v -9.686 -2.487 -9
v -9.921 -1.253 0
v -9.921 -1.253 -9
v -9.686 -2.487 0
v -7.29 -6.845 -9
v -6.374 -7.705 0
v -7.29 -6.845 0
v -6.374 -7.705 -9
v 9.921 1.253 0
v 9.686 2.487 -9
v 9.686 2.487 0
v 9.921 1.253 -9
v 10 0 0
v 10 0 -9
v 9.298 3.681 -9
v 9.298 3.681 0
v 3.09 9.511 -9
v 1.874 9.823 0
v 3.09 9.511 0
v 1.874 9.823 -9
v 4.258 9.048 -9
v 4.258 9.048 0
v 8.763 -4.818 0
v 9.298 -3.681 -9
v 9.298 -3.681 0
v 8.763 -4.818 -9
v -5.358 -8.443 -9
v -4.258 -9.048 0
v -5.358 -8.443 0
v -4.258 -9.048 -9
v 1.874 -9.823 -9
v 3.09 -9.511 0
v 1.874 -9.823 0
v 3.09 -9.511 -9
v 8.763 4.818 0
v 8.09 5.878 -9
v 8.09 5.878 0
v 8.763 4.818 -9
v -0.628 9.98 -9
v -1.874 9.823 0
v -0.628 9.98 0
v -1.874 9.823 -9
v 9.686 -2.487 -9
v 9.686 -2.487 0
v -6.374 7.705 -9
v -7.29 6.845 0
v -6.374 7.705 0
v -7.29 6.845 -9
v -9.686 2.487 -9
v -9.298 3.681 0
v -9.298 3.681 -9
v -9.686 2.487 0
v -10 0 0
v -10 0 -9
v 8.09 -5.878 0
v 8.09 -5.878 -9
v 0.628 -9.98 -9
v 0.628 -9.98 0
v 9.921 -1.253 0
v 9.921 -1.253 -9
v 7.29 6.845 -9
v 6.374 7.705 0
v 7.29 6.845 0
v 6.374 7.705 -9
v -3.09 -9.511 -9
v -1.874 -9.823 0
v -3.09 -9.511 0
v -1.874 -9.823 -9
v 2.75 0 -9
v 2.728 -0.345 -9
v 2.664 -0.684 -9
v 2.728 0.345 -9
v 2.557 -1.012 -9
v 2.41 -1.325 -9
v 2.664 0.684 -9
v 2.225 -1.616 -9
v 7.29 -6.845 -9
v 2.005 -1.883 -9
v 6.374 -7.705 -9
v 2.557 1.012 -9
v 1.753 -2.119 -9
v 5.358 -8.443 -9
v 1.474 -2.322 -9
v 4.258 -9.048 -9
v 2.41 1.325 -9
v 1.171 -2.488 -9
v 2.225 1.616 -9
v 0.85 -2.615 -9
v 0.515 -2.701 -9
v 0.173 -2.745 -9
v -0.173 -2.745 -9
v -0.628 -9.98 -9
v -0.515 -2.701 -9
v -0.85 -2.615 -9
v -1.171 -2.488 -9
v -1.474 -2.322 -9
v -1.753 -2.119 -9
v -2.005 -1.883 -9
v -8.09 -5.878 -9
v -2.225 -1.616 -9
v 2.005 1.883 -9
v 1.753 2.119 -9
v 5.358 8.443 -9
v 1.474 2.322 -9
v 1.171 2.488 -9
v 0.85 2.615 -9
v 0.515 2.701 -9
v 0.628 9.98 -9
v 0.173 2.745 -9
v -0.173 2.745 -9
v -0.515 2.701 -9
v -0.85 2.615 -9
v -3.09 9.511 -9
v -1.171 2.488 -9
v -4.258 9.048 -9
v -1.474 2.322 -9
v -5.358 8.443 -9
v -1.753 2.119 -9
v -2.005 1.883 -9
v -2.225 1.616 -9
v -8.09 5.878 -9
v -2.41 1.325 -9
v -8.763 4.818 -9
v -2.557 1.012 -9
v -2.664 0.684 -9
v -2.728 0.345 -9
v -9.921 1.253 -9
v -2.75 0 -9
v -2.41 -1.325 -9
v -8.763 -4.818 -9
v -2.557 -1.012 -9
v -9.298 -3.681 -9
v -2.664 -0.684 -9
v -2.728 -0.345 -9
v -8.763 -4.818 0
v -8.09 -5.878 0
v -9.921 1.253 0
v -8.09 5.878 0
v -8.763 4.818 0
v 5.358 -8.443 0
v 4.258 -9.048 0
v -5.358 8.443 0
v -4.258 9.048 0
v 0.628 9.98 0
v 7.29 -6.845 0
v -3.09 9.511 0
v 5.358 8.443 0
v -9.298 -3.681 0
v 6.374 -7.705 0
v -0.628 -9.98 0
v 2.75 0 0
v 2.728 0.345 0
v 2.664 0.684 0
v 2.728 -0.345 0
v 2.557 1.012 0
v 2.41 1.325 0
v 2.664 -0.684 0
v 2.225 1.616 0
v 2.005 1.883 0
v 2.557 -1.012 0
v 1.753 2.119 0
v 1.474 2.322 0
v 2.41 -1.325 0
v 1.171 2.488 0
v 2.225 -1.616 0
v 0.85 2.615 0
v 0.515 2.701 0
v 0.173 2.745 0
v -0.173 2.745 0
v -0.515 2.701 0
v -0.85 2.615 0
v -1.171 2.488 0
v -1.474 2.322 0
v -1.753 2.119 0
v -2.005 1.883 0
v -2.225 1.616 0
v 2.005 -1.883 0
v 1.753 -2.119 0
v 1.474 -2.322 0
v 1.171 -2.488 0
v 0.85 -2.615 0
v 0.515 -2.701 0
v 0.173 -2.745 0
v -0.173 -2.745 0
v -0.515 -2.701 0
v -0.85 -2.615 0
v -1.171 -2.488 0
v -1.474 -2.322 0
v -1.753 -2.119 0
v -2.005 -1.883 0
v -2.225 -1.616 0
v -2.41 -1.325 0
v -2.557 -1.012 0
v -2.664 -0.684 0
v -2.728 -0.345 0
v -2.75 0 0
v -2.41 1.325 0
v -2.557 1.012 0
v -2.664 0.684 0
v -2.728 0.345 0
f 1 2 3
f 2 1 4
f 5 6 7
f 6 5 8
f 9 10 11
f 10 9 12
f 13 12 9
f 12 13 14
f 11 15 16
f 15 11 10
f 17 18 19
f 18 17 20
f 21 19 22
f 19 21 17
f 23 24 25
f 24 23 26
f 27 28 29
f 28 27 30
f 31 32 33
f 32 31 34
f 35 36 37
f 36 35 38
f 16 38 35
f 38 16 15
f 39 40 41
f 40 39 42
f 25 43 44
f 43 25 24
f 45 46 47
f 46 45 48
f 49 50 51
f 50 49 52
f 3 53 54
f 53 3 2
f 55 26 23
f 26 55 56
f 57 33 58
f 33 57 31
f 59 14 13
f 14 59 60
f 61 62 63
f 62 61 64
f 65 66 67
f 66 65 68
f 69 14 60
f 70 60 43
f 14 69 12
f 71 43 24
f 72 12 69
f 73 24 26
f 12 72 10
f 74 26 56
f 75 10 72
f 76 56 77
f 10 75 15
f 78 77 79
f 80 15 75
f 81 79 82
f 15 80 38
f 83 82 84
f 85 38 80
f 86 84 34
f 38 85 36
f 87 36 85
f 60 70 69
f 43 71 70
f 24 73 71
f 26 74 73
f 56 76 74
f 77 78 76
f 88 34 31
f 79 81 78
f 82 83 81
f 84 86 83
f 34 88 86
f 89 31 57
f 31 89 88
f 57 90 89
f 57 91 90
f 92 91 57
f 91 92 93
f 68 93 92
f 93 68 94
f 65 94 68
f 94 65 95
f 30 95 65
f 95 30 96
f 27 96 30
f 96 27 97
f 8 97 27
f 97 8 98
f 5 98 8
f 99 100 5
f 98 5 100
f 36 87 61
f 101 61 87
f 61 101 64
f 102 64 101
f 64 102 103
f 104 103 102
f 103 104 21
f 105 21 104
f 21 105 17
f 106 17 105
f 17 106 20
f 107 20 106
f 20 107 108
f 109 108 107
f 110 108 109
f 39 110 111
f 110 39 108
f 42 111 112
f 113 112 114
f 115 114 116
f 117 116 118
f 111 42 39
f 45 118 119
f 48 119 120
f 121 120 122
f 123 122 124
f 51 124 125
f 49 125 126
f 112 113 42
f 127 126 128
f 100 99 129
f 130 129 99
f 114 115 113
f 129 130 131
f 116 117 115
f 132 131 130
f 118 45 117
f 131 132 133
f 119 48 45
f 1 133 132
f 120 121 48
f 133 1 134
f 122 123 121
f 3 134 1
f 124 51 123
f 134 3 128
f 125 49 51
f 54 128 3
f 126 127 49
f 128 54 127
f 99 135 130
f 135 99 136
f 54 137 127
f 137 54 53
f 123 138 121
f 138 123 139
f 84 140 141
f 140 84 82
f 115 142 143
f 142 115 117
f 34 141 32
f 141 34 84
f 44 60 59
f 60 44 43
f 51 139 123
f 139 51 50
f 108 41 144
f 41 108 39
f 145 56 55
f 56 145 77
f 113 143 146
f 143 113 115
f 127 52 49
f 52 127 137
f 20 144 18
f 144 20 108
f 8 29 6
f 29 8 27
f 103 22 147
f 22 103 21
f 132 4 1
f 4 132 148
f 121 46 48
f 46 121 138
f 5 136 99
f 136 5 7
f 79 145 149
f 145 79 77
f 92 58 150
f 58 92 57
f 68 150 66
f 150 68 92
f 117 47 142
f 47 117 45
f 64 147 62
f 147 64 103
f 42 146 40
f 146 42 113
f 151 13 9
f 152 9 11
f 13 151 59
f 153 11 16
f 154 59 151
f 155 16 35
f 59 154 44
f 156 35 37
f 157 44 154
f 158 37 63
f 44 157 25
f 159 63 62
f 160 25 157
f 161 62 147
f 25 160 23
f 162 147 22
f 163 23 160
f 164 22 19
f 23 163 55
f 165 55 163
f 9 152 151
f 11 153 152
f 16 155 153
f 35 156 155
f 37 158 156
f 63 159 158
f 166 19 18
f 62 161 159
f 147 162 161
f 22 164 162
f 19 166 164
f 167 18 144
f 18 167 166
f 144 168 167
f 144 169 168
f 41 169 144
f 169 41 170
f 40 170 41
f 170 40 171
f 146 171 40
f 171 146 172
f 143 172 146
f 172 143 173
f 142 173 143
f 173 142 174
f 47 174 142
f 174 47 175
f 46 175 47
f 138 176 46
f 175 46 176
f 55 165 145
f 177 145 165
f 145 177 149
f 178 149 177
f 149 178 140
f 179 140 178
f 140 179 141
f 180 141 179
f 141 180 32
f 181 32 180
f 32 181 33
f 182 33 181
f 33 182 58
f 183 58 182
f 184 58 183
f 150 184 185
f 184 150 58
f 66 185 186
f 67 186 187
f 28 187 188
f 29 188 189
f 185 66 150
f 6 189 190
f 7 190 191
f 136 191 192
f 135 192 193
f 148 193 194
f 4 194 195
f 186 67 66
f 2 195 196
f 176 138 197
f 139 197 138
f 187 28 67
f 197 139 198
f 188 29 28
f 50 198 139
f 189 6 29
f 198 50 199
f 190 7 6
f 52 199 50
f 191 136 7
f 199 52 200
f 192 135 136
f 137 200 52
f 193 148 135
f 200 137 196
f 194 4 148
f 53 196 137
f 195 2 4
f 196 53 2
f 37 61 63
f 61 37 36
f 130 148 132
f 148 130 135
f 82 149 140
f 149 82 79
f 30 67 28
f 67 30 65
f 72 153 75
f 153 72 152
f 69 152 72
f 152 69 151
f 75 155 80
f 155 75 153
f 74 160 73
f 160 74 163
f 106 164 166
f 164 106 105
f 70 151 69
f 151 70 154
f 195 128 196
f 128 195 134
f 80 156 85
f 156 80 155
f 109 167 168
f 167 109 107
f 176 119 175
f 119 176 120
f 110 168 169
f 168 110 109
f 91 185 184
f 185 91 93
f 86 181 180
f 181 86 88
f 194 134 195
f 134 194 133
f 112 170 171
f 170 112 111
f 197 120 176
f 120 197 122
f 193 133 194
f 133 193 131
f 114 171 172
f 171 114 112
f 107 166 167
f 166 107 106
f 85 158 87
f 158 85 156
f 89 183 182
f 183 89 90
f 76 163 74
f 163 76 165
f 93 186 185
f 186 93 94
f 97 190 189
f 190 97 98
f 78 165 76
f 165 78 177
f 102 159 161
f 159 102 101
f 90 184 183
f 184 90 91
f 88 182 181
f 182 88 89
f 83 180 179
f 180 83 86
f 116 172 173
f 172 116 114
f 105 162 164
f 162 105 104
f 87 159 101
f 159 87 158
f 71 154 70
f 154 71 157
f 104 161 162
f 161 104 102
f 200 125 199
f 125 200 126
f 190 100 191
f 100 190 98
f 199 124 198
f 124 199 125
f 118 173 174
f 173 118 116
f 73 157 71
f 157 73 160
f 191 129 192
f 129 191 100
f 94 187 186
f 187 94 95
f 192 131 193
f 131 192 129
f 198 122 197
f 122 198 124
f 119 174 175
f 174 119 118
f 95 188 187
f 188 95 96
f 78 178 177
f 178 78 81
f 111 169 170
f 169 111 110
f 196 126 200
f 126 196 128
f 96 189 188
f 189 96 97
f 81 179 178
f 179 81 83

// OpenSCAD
$fn = 50;


difference() {
	union() {
		translate(v = [0, 0, -9.0000000000]) {
			cylinder(h = 9, r = 10.0000000000);
		}
		cylinder(h = 0, r = 20.0000000000);
	}
	union() {
		#translate(v = [0, 0, -9]) {
			cylinder(h = 9, r = 2.7500000000);
		}
	}
}
